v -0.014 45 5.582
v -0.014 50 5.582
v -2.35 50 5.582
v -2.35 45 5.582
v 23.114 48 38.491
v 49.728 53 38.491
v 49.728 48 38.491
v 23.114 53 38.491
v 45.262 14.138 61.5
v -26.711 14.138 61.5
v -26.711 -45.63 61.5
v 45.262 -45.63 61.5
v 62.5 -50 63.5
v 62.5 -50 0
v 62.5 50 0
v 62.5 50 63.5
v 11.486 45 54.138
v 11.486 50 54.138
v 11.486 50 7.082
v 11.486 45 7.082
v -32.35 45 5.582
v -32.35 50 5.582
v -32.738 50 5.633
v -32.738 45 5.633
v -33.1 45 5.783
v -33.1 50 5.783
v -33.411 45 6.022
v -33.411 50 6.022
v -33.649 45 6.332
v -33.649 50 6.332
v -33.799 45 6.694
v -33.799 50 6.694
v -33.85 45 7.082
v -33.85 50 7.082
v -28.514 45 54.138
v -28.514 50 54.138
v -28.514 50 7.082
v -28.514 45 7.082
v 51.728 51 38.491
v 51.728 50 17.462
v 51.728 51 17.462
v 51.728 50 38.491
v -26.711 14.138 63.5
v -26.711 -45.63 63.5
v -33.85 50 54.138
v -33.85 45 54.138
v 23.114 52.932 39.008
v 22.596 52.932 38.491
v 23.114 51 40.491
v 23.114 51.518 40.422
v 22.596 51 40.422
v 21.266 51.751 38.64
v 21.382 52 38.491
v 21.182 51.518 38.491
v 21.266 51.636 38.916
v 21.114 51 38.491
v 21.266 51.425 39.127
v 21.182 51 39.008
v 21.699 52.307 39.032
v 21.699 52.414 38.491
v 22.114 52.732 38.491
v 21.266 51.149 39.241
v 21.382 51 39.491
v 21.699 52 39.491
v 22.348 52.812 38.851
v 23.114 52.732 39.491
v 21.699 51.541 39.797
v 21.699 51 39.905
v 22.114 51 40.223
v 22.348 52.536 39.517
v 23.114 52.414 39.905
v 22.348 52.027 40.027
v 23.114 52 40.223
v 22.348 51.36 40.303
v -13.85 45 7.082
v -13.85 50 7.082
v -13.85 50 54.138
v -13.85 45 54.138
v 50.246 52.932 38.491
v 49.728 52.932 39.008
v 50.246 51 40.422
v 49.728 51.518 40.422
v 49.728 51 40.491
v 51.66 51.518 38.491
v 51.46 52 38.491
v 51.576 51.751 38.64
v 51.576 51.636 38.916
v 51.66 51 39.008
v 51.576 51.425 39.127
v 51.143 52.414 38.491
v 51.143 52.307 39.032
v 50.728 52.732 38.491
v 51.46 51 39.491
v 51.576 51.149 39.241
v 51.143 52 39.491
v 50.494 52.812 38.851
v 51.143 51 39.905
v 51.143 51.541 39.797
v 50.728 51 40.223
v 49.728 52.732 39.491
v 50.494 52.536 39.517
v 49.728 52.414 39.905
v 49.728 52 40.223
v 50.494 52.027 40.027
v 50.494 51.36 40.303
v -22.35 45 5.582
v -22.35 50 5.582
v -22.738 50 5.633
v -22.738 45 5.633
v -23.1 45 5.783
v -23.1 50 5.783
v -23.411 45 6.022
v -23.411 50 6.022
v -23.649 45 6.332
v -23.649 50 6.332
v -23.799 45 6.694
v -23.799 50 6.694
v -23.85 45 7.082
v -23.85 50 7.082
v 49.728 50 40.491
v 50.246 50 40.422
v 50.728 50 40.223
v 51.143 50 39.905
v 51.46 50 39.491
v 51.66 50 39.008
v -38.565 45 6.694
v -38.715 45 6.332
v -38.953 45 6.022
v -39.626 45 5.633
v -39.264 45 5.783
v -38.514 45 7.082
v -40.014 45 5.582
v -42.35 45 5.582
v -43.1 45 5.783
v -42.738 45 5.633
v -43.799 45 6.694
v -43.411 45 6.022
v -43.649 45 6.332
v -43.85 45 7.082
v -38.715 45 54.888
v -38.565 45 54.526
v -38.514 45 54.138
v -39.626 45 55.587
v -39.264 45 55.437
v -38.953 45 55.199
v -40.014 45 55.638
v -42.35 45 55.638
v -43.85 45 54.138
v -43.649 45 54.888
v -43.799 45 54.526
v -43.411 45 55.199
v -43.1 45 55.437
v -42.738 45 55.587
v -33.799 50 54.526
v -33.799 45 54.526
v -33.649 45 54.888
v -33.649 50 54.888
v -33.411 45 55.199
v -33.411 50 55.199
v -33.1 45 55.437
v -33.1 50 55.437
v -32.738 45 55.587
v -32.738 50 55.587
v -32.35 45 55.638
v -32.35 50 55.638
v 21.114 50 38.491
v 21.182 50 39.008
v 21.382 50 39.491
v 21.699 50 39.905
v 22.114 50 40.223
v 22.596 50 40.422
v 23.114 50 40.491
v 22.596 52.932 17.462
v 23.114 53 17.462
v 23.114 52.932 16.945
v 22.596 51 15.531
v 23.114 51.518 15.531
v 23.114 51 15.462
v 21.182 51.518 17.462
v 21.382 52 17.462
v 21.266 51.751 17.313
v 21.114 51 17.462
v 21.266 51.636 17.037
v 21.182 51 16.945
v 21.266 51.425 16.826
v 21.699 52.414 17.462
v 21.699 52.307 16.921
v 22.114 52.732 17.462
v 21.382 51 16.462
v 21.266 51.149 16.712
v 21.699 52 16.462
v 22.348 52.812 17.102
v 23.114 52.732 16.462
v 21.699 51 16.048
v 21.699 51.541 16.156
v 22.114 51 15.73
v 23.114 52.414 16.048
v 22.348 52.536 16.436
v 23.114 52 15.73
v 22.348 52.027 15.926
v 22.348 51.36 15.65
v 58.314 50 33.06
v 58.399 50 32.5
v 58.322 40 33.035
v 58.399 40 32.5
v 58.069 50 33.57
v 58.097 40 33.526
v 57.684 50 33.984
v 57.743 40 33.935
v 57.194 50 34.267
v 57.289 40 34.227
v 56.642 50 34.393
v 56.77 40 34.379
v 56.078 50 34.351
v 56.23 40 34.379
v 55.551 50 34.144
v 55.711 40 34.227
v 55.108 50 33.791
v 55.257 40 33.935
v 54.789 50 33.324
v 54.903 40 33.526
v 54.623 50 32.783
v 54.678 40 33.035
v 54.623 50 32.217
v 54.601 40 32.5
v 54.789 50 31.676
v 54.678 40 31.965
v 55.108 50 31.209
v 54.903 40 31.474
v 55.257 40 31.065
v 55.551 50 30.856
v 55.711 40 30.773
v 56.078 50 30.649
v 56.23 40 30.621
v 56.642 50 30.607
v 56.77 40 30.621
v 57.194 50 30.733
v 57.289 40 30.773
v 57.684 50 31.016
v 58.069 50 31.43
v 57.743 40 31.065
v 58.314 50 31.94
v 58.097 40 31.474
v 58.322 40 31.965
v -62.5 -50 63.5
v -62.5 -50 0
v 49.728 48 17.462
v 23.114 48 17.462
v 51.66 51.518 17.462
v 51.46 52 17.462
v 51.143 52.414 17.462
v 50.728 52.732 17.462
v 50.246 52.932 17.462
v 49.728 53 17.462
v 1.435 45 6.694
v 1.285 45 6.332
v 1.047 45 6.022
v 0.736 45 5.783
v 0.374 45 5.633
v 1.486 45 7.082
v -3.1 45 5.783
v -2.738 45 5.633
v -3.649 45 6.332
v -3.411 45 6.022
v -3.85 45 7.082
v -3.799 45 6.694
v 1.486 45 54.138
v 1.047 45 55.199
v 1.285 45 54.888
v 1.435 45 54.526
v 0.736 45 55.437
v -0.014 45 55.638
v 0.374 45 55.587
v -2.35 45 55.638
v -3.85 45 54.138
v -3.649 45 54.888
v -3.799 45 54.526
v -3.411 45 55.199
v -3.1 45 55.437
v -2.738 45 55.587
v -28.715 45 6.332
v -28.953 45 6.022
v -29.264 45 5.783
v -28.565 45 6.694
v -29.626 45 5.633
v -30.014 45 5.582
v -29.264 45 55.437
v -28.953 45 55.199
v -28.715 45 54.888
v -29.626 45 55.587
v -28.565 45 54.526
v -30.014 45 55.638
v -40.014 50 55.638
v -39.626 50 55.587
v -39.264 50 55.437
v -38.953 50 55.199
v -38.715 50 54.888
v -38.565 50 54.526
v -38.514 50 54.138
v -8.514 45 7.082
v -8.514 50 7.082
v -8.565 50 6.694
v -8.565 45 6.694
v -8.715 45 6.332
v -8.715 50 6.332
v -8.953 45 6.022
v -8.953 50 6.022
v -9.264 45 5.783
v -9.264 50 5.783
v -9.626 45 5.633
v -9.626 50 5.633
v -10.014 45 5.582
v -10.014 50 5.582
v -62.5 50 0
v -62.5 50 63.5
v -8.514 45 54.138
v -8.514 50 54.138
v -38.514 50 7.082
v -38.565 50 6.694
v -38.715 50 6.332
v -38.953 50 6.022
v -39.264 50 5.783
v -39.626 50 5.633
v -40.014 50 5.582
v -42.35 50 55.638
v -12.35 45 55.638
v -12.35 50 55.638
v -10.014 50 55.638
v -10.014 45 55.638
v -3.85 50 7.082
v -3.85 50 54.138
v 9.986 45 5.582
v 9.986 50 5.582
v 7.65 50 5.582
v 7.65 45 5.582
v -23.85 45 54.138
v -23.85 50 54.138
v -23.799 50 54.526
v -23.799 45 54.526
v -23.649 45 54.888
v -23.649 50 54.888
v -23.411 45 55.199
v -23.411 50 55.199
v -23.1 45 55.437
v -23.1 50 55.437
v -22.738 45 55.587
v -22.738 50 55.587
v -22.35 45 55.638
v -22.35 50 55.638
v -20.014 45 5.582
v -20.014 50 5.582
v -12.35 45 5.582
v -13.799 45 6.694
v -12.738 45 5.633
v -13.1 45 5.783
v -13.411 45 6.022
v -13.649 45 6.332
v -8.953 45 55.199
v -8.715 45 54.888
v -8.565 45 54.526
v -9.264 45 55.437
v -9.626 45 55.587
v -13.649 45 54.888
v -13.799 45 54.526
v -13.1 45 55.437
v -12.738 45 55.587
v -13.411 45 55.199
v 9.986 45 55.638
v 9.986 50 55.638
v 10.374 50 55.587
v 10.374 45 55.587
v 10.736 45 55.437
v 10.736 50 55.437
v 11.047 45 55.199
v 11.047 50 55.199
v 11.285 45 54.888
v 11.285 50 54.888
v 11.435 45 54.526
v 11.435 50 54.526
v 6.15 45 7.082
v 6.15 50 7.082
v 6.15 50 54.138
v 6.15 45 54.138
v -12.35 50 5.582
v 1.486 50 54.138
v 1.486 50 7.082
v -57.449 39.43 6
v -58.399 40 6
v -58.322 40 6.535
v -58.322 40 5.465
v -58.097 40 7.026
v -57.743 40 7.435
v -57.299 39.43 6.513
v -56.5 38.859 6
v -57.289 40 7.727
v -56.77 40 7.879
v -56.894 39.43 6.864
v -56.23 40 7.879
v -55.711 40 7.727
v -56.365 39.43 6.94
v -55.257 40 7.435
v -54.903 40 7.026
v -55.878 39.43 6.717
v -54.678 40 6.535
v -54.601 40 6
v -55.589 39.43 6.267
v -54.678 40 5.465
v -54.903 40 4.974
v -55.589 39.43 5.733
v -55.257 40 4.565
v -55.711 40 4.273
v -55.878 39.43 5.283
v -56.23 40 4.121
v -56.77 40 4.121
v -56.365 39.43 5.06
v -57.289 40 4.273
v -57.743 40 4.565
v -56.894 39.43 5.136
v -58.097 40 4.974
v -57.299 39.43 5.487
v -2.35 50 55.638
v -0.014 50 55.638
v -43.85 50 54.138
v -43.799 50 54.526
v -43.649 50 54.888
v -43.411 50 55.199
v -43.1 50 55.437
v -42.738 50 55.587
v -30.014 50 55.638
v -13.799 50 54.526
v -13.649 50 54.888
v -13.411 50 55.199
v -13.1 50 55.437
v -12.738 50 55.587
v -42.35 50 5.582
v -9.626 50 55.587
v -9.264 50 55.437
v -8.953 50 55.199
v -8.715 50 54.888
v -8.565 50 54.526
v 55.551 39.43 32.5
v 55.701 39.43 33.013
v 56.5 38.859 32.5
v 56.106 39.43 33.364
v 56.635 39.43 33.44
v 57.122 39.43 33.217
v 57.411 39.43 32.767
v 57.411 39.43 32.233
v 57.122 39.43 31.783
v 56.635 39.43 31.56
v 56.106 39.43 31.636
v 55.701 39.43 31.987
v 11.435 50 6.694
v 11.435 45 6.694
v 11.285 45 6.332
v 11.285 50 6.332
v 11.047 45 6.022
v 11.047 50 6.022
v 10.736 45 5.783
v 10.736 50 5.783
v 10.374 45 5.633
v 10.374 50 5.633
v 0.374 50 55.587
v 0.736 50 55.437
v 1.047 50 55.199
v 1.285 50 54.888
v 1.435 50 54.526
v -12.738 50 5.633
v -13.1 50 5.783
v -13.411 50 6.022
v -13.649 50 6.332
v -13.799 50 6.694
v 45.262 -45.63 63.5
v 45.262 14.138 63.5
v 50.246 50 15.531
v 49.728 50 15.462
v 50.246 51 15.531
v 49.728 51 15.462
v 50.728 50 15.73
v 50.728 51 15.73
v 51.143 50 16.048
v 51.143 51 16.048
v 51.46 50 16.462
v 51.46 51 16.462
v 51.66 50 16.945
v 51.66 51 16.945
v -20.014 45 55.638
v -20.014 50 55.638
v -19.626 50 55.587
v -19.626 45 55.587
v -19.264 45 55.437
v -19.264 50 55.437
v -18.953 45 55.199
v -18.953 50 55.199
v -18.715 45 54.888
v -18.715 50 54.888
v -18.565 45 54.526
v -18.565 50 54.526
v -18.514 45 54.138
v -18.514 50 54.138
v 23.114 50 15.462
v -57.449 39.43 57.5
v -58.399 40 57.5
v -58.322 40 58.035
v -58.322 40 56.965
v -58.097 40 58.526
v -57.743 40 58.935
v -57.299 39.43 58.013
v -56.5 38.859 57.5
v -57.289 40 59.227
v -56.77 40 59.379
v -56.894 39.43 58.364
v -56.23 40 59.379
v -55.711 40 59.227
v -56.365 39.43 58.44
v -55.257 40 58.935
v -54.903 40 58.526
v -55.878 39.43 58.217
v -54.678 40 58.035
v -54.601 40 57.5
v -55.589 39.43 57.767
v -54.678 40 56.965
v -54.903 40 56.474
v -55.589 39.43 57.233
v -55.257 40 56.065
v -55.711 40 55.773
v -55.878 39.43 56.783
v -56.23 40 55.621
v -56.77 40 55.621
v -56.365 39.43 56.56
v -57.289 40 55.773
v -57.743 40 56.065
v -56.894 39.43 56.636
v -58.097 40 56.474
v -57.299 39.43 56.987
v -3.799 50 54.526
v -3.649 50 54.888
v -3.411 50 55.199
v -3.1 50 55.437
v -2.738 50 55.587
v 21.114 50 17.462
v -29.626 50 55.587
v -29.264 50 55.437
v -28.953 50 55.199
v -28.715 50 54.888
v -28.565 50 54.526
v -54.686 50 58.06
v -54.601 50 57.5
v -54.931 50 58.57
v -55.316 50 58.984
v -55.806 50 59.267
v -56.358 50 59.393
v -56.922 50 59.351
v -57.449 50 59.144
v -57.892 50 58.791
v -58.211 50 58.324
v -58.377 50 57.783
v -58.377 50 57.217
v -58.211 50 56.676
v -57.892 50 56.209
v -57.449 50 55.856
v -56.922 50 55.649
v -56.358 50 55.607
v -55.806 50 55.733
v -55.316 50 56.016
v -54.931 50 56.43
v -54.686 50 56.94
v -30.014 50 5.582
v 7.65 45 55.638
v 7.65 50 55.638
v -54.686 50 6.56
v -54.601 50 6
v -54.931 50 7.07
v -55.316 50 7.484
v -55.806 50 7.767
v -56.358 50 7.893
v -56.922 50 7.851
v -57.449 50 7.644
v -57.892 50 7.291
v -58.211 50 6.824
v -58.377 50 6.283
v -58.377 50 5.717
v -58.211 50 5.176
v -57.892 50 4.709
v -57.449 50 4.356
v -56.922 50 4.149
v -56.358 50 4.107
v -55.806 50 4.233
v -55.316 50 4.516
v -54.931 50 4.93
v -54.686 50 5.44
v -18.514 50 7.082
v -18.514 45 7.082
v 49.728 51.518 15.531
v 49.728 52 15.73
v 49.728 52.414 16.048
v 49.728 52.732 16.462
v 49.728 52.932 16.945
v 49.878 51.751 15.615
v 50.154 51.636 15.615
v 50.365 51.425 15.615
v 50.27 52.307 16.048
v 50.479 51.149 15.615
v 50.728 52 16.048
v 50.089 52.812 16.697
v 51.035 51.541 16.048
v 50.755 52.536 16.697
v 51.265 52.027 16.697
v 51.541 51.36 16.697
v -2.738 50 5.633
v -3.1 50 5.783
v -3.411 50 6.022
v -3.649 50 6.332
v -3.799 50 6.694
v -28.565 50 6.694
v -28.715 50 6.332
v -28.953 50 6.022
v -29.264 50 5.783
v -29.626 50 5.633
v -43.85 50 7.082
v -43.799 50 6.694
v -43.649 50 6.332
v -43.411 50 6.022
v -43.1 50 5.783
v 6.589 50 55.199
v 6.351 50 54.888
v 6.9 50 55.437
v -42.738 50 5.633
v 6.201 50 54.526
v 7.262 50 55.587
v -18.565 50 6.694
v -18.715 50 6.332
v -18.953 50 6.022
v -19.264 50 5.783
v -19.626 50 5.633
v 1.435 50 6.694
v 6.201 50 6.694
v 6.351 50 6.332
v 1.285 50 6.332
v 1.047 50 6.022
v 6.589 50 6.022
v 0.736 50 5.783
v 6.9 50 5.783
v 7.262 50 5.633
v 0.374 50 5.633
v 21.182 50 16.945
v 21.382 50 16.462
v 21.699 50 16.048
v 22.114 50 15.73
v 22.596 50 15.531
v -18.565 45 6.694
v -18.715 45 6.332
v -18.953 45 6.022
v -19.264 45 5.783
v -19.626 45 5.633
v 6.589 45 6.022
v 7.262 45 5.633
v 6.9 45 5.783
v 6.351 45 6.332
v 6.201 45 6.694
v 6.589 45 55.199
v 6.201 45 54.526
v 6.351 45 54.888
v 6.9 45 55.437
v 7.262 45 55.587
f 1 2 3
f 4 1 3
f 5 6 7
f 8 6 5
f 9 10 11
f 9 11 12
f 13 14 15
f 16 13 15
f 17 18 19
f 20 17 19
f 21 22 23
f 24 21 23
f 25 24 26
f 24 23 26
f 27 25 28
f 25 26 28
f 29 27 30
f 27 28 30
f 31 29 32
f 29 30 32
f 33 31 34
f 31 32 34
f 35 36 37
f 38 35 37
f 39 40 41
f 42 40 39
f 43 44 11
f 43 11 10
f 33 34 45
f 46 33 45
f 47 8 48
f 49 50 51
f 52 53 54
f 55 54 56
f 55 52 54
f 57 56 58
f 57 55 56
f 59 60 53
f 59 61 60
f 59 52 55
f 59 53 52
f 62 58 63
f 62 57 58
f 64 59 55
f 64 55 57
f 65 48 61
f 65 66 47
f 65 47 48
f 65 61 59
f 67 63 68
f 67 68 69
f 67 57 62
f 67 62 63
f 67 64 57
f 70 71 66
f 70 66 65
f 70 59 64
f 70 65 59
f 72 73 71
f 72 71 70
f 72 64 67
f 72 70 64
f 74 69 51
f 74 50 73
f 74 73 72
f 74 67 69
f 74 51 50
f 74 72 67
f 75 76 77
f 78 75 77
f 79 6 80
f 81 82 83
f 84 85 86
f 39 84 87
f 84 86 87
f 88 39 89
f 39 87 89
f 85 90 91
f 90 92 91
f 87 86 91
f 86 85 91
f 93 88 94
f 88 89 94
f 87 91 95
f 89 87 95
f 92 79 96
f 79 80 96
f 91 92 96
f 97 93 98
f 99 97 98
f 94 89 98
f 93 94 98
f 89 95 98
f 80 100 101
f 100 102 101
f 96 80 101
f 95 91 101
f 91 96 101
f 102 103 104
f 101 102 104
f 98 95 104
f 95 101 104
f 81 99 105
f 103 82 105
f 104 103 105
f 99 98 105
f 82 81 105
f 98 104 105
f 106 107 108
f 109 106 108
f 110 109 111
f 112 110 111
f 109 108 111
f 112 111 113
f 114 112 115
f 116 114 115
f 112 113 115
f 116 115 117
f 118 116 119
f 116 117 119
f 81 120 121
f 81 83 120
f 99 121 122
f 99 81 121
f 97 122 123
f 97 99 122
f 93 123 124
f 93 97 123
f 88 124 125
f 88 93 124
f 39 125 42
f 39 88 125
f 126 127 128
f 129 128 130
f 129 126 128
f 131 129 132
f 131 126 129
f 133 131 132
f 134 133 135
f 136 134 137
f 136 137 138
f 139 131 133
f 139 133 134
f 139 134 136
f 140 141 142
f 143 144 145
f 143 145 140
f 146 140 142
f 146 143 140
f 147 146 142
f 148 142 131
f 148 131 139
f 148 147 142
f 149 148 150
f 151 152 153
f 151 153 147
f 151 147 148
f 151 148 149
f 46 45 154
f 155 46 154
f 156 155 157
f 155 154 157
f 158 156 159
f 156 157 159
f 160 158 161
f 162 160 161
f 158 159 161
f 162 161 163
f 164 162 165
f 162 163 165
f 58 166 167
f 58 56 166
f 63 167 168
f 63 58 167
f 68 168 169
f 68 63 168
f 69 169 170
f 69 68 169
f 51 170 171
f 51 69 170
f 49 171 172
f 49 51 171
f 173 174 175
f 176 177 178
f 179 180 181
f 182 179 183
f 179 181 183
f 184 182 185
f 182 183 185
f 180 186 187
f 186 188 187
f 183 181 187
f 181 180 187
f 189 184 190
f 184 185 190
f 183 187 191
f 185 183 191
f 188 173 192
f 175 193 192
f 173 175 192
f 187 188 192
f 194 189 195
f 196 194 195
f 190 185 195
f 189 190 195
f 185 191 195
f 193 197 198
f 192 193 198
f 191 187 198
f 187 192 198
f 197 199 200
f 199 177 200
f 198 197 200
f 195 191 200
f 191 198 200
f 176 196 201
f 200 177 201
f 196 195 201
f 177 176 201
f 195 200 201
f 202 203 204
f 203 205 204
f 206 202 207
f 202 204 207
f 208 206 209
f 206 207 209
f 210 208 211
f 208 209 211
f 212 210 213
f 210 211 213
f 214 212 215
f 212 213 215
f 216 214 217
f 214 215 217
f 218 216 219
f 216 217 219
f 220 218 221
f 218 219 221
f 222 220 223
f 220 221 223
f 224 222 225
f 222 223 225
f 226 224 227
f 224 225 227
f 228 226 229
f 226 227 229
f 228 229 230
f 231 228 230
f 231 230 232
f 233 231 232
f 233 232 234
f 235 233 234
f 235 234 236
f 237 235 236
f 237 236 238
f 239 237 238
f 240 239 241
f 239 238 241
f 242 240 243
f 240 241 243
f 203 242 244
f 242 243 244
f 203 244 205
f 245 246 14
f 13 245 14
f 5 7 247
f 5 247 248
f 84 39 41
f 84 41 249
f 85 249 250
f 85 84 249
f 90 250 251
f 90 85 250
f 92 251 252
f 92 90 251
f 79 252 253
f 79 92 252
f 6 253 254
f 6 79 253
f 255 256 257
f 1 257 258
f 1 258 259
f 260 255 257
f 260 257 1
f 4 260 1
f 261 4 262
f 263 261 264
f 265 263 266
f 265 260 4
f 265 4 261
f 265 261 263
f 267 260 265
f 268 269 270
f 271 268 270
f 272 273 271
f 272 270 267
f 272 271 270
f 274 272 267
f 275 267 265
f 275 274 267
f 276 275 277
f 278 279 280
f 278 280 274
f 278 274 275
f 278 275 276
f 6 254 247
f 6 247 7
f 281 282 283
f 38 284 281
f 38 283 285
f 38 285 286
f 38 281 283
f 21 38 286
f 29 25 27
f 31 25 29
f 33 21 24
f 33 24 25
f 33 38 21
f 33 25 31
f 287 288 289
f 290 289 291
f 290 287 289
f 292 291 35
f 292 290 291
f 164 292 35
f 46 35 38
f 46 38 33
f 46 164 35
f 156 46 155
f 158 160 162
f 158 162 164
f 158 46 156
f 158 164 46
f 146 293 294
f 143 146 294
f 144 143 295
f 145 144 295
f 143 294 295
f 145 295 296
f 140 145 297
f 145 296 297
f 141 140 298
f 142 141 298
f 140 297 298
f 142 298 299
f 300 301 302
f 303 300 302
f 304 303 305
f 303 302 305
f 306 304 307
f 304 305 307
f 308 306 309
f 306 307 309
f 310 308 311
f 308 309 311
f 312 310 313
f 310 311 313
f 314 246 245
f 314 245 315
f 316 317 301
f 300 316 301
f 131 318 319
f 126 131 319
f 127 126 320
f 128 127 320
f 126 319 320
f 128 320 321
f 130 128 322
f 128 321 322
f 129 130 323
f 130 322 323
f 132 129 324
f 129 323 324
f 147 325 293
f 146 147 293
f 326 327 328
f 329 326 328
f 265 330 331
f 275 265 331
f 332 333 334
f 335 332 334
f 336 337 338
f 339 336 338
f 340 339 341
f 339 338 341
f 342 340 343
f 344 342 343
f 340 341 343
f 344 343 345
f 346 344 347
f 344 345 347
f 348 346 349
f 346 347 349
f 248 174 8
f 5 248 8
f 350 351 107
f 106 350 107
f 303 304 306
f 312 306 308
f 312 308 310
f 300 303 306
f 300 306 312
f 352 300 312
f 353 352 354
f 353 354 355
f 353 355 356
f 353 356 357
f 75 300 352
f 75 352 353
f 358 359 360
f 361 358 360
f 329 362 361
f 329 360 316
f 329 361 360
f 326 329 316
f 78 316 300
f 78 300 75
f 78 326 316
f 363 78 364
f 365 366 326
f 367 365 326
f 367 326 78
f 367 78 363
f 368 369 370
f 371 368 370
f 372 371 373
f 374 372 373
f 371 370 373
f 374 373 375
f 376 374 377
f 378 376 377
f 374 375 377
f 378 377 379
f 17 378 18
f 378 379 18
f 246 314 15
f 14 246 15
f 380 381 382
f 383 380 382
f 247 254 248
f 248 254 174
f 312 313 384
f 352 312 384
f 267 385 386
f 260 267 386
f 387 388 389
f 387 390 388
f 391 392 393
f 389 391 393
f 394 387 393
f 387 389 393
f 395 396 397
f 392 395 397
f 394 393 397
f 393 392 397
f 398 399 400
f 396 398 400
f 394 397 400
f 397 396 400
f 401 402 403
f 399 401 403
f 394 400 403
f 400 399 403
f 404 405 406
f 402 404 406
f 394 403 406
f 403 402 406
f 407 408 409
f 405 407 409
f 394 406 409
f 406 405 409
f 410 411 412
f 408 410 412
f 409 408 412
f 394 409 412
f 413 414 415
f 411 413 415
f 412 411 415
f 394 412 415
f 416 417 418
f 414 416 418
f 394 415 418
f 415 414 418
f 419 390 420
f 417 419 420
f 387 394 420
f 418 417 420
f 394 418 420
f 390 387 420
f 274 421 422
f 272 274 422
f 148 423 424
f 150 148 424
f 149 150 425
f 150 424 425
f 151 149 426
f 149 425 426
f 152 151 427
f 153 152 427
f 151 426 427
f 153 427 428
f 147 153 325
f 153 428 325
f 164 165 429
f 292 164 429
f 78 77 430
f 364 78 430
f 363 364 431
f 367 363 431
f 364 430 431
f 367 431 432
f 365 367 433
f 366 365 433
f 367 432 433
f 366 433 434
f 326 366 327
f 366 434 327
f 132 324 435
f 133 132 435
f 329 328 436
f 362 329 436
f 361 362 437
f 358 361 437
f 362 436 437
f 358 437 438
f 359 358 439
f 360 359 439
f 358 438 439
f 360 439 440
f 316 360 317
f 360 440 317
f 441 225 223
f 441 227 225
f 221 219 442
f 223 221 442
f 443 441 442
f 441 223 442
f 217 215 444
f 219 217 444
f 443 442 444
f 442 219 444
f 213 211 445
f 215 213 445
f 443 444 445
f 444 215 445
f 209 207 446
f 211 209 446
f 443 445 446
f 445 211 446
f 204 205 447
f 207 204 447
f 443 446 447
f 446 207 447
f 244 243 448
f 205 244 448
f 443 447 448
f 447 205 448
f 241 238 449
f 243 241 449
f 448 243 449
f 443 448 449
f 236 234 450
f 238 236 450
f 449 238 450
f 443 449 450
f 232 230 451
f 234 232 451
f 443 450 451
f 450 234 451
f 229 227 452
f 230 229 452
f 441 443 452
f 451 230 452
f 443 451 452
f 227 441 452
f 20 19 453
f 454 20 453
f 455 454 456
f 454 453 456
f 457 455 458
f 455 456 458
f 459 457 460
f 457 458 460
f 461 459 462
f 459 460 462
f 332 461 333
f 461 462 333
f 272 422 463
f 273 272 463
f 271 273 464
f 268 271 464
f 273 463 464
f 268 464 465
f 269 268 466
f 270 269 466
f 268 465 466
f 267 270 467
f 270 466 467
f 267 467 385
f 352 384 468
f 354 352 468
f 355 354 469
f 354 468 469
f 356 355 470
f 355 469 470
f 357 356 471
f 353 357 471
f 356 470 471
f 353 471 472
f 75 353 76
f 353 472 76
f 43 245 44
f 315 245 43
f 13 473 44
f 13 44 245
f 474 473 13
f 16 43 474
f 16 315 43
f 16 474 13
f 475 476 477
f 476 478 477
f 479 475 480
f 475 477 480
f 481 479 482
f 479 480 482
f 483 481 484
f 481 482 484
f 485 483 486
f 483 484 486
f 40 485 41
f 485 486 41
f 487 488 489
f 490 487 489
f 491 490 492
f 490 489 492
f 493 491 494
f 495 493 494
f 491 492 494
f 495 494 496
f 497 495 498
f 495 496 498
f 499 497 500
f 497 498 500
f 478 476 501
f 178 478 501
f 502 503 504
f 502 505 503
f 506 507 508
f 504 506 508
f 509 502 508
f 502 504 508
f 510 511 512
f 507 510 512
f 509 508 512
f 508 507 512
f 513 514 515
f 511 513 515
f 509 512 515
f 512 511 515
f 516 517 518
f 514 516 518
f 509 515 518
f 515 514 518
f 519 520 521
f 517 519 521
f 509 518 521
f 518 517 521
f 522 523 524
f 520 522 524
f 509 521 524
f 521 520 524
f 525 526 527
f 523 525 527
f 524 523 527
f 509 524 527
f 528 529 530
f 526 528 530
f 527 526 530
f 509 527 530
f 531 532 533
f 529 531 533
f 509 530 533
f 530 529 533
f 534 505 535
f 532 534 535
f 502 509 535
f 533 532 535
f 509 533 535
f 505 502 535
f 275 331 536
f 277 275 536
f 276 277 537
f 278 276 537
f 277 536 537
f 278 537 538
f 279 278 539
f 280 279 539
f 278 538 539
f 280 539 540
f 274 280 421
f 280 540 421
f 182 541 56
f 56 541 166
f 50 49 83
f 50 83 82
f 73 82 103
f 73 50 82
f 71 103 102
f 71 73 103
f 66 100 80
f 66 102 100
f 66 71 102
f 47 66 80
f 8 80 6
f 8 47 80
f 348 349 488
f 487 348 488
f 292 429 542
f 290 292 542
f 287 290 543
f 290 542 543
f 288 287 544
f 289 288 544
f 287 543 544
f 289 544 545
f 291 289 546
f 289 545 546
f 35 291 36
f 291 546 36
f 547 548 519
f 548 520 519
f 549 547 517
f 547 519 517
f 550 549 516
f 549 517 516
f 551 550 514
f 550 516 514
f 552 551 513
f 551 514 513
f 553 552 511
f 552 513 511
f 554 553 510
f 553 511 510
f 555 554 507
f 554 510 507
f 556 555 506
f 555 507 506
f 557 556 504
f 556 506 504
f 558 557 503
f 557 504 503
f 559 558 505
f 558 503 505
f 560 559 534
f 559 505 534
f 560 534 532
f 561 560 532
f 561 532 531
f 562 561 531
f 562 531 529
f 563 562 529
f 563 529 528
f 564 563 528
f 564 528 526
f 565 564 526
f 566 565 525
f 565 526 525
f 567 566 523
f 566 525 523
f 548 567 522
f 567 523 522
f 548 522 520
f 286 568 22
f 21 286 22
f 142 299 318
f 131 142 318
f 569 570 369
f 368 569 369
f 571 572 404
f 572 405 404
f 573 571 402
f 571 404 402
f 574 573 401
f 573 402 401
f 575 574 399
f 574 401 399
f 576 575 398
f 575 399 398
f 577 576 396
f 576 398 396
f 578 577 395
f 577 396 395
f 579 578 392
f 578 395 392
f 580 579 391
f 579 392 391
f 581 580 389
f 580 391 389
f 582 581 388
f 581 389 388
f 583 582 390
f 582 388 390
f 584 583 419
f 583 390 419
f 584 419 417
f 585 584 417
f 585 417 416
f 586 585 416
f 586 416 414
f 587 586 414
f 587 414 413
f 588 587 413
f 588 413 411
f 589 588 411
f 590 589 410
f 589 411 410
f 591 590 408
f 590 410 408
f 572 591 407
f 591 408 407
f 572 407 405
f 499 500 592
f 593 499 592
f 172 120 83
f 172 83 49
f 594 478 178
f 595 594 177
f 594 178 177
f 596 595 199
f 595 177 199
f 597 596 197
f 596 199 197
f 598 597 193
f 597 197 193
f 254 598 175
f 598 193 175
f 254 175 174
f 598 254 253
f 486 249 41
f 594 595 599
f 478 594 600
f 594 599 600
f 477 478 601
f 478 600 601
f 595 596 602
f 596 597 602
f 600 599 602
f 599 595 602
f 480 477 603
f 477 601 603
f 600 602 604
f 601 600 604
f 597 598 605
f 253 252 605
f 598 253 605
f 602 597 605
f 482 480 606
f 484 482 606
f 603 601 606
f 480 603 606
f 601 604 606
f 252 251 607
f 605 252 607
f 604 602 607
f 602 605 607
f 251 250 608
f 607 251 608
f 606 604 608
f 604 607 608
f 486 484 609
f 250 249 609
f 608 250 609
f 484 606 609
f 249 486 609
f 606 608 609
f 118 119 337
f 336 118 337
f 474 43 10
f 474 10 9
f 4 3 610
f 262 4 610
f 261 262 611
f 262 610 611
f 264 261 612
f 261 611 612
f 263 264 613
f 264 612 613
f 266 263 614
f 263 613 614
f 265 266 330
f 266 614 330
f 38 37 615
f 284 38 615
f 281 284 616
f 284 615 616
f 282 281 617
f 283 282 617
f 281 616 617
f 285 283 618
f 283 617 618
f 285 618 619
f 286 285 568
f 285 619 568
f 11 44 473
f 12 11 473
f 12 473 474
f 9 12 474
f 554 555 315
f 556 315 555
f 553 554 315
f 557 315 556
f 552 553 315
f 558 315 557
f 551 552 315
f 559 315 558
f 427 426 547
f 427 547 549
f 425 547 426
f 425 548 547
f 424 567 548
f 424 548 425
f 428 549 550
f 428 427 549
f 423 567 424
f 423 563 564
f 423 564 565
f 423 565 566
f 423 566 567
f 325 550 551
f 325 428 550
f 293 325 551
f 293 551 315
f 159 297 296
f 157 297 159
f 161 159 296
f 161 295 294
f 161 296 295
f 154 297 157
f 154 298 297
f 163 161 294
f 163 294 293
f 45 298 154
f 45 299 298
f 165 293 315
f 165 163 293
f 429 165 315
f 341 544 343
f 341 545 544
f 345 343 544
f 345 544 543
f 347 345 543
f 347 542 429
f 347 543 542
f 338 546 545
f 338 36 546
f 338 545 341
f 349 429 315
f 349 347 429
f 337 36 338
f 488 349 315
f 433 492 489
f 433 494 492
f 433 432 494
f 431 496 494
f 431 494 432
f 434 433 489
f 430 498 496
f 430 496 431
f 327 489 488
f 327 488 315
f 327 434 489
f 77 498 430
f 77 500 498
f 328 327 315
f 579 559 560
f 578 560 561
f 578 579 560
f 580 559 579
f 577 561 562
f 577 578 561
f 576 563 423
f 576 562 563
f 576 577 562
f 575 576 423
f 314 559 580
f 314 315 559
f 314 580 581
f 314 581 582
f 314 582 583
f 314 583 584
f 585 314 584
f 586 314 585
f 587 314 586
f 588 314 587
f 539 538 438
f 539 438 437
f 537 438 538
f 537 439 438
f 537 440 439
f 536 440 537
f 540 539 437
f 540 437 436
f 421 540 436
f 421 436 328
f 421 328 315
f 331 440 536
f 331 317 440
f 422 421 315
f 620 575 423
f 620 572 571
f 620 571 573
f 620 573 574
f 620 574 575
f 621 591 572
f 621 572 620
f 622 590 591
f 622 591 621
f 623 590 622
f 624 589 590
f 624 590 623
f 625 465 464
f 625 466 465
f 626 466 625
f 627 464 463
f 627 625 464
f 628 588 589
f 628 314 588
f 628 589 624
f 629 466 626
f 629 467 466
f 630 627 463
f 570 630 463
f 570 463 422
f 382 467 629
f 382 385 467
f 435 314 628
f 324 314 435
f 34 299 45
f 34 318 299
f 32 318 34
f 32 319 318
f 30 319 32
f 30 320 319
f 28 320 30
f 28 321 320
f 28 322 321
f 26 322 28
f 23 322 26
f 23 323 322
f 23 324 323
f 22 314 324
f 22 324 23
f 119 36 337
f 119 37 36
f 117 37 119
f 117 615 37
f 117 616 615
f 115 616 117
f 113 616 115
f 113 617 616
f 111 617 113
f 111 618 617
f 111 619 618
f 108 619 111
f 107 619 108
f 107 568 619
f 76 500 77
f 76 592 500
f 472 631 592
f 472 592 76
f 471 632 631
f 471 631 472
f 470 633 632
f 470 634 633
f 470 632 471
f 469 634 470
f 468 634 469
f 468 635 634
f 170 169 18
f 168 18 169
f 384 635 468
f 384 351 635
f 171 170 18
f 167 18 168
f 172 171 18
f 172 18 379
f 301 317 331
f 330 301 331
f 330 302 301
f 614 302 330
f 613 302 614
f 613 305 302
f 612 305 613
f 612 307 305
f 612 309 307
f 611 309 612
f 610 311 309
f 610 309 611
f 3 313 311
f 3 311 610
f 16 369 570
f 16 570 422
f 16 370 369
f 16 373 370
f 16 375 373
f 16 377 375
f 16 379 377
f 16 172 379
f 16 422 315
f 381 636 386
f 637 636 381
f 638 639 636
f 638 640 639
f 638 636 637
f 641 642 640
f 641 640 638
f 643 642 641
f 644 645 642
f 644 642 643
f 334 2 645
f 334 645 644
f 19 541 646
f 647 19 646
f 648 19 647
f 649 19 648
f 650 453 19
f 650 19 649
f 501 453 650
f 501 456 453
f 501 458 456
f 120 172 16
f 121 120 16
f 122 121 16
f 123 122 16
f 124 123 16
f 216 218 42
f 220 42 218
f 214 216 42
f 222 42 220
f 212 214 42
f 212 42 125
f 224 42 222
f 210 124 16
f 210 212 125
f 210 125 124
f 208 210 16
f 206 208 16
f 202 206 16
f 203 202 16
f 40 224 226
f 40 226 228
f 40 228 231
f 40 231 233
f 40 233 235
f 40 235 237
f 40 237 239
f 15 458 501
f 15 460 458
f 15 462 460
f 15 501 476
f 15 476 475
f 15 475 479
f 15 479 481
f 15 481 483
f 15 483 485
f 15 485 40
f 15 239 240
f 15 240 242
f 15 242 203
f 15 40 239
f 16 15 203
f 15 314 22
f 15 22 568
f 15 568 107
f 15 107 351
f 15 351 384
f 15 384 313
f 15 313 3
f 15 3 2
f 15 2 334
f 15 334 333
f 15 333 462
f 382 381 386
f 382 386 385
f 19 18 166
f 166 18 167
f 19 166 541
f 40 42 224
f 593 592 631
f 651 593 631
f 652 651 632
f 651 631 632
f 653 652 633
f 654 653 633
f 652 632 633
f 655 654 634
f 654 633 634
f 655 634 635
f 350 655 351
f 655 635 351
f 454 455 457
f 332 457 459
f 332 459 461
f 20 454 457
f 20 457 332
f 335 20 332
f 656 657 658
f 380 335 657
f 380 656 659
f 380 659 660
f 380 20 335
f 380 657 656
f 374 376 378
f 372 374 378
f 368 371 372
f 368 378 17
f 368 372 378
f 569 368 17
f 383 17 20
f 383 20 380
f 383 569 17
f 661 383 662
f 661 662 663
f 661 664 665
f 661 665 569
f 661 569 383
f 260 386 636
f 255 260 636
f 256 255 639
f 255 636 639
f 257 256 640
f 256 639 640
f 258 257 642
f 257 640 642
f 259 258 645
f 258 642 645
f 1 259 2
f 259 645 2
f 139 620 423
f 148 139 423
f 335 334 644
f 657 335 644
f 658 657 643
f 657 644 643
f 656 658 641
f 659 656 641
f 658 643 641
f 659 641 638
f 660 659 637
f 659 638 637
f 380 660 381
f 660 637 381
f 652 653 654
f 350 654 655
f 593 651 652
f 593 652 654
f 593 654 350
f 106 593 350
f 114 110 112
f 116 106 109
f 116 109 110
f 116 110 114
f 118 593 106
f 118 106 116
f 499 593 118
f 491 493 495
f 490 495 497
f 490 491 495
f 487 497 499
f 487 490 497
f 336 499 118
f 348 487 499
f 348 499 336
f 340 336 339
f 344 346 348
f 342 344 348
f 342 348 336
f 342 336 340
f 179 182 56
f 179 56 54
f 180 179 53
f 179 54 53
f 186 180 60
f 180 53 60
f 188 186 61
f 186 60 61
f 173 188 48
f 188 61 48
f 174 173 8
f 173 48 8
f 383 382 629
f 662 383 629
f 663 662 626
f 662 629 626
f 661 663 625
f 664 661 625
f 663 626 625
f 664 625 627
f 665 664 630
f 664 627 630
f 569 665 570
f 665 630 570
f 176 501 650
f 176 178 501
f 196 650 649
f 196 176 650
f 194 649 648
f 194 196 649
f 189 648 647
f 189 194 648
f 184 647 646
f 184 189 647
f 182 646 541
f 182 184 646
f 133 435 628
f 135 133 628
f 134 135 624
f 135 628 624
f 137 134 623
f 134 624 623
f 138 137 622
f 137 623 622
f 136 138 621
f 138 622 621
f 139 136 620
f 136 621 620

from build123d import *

# Parameters (mm, degrees)
F0_W      = 125
F0_H      = 100
F1_DEPTH  = 63.5
F3_D      = 3.7973
F3_DEPTH  = 10
F3_TIP    = 1.1408240143
F2_W      = 30.6147579104
F2_H      = 25.0281281769
F4_DEPTH  = 3
F5_R      = 2
F6_W      = 71.9727240503
F6_H      = 59.7681310028
F7_DEPTH  = 2
F9_DEPTH  = 5
F10_DEPTH = 5


with BuildPart() as f1:
    # F0 (on Top) → F1 (new body)
    with BuildSketch(Plane.XY):
        Rectangle(F0_W, F0_H)
    extrude(amount=F1_DEPTH)

    # F3
    with Locations(Plane(origin=(0, 50, 0), x_dir=(-1, 0, 0), z_dir=(0, 1, 0))):
        with Locations((-56.5, 32.5), (56.5, 57.5), (56.5, 6)):
            Hole(F3_D / 2, depth=F3_DEPTH)
            with Locations((0, 0, -(F3_DEPTH + F3_TIP / 2))):  # 118° drill point
                Cone(0, F3_D / 2, F3_TIP, mode=Mode.SUBTRACT)

    # F2 (on face) → F4 (join)
    with BuildSketch(Plane(origin=(0, 50, 0), x_dir=(-1, 0, 0), z_dir=(0, 1, 0))):
        with Locations((-36.4209739491, 27.976481244)):
            Rectangle(F2_W, F2_H)
    extrude(amount=F4_DEPTH)

    # F5
    f5_edges = [f1.edges().sort_by_distance(p)[0] for p in [
        (36.420974, 53, 40.490545),
        (51.728353, 53, 27.976481),
        (36.420974, 53, 15.462417),
        (21.113595, 53, 27.976481),
        (21.113595, 51.5, 40.490545),
        (21.113595, 51.5, 15.462417),
        (51.728353, 51.5, 40.490545),
        (51.728353, 51.5, 15.462417),
    ]]
    fillet(f5_edges, radius=F5_R)

    # F6 (on face) → F7 (cut)
    with BuildSketch(Plane.XY.offset(63.5)):
        with Locations((9.2756617814, -15.7460393384)):
            Rectangle(F6_W, F6_H)
    extrude(amount=-F7_DEPTH, mode=Mode.SUBTRACT)

    # F8 (on face) → F9 (cut)
    with BuildSketch(Plane(origin=(0, 50, 0), x_dir=(-1, 0, 0), z_dir=(0, 1, 0))):
        with BuildLine():
            Line((-7.6500625238, 55.638247937), (-9.9858876914, 55.638247937))
            ThreePointArc((-9.9858876914, 55.638247937), (-11.0465478632, 55.1989081087), (-11.4858876914, 54.138247937))
            Line((-11.4858876914, 54.138247937), (-11.4858876914, 7.0822326578))
            ThreePointArc((-11.4858876914, 7.0822326578), (-11.0465478632, 6.021572486), (-9.9858876914, 5.5822326578))
            Line((-9.9858876914, 5.5822326578), (-7.6500625238, 5.5822326578))
            ThreePointArc((-7.6500625238, 5.5822326578), (-6.589402352, 6.021572486), (-6.1500625238, 7.0822326578))
            Line((-6.1500625238, 7.0822326578), (-6.1500625238, 54.138247937))
            ThreePointArc((-6.1500625238, 54.138247937), (-6.589402352, 55.1989081087), (-7.6500625238, 55.638247937))
        make_face()
        with BuildLine():
            Line((2.3499374762, 55.638247937), (0.0141123086, 55.638247937))
            ThreePointArc((0.0141123086, 55.638247937), (-1.0465478632, 55.1989081087), (-1.4858876914, 54.138247937))
            Line((-1.4858876914, 54.138247937), (-1.4858876914, 7.0822326578))
            ThreePointArc((-1.4858876914, 7.0822326578), (-1.0465478632, 6.021572486), (0.0141123086, 5.5822326578))
            Line((0.0141123086, 5.5822326578), (2.3499374762, 5.5822326578))
            ThreePointArc((2.3499374762, 5.5822326578), (3.410597648, 6.021572486), (3.8499374762, 7.0822326578))
            Line((3.8499374762, 7.0822326578), (3.8499374762, 54.138247937))
            ThreePointArc((3.8499374762, 54.138247937), (3.410597648, 55.1989081087), (2.3499374762, 55.638247937))
        make_face()
        with BuildLine():
            Line((12.3499374762, 55.638247937), (10.0141123086, 55.638247937))
            ThreePointArc((10.0141123086, 55.638247937), (8.9534521368, 55.1989081087), (8.5141123086, 54.138247937))
            Line((8.5141123086, 54.138247937), (8.5141123086, 7.0822326578))
            ThreePointArc((8.5141123086, 7.0822326578), (8.9534521368, 6.021572486), (10.0141123086, 5.5822326578))
            Line((10.0141123086, 5.5822326578), (12.3499374762, 5.5822326578))
            ThreePointArc((12.3499374762, 5.5822326578), (13.410597648, 6.021572486), (13.8499374762, 7.0822326578))
            Line((13.8499374762, 7.0822326578), (13.8499374762, 54.138247937))
            ThreePointArc((13.8499374762, 54.138247937), (13.410597648, 55.1989081087), (12.3499374762, 55.638247937))
        make_face()
        with BuildLine():
            Line((22.3499374762, 55.638247937), (20.0141123086, 55.638247937))
            ThreePointArc((20.0141123086, 55.638247937), (18.9534521368, 55.1989081087), (18.5141123086, 54.138247937))
            Line((18.5141123086, 54.138247937), (18.5141123086, 7.0822326578))
            ThreePointArc((18.5141123086, 7.0822326578), (18.9534521368, 6.021572486), (20.0141123086, 5.5822326578))
            Line((20.0141123086, 5.5822326578), (22.3499374762, 5.5822326578))
            ThreePointArc((22.3499374762, 5.5822326578), (23.410597648, 6.021572486), (23.8499374762, 7.0822326578))
            Line((23.8499374762, 7.0822326578), (23.8499374762, 54.138247937))
            ThreePointArc((23.8499374762, 54.138247937), (23.410597648, 55.1989081087), (22.3499374762, 55.638247937))
        make_face()
        with BuildLine():
            Line((32.3499374762, 55.638247937), (30.0141123086, 55.638247937))
            ThreePointArc((30.0141123086, 55.638247937), (28.9534521368, 55.1989081087), (28.5141123086, 54.138247937))
            Line((28.5141123086, 54.138247937), (28.5141123086, 7.0822326578))
            ThreePointArc((28.5141123086, 7.0822326578), (28.9534521368, 6.021572486), (30.0141123086, 5.5822326578))
            Line((30.0141123086, 5.5822326578), (32.3499374762, 5.5822326578))
            ThreePointArc((32.3499374762, 5.5822326578), (33.410597648, 6.021572486), (33.8499374762, 7.0822326578))
            Line((33.8499374762, 7.0822326578), (33.8499374762, 54.138247937))
            ThreePointArc((33.8499374762, 54.138247937), (33.410597648, 55.1989081087), (32.3499374762, 55.638247937))
        make_face()
        with BuildLine():
            Line((42.3499374762, 55.638247937), (40.0141123086, 55.638247937))
            ThreePointArc((40.0141123086, 55.638247937), (38.9534521368, 55.1989081087), (38.5141123086, 54.138247937))
            Line((38.5141123086, 54.138247937), (38.5141123086, 7.0822326578))
            ThreePointArc((38.5141123086, 7.0822326578), (38.9534521368, 6.021572486), (40.0141123086, 5.5822326578))
            Line((40.0141123086, 5.5822326578), (42.3499374762, 5.5822326578))
            ThreePointArc((42.3499374762, 5.5822326578), (43.410597648, 6.021572486), (43.8499374762, 7.0822326578))
            Line((43.8499374762, 7.0822326578), (43.8499374762, 54.138247937))
            ThreePointArc((43.8499374762, 54.138247937), (43.410597648, 55.1989081087), (42.3499374762, 55.638247937))
        make_face()
    extrude(amount=-F9_DEPTH, mode=Mode.SUBTRACT)

    # F10 (cut): a face of the model
    f10_faces = [f1.faces().sort_by_distance(p)[0] for p in [
        (36.4209739491, 53, 27.976481244),
    ]]
    extrude(f10_faces, amount=-F10_DEPTH, mode=Mode.SUBTRACT)


solid = f1.part
